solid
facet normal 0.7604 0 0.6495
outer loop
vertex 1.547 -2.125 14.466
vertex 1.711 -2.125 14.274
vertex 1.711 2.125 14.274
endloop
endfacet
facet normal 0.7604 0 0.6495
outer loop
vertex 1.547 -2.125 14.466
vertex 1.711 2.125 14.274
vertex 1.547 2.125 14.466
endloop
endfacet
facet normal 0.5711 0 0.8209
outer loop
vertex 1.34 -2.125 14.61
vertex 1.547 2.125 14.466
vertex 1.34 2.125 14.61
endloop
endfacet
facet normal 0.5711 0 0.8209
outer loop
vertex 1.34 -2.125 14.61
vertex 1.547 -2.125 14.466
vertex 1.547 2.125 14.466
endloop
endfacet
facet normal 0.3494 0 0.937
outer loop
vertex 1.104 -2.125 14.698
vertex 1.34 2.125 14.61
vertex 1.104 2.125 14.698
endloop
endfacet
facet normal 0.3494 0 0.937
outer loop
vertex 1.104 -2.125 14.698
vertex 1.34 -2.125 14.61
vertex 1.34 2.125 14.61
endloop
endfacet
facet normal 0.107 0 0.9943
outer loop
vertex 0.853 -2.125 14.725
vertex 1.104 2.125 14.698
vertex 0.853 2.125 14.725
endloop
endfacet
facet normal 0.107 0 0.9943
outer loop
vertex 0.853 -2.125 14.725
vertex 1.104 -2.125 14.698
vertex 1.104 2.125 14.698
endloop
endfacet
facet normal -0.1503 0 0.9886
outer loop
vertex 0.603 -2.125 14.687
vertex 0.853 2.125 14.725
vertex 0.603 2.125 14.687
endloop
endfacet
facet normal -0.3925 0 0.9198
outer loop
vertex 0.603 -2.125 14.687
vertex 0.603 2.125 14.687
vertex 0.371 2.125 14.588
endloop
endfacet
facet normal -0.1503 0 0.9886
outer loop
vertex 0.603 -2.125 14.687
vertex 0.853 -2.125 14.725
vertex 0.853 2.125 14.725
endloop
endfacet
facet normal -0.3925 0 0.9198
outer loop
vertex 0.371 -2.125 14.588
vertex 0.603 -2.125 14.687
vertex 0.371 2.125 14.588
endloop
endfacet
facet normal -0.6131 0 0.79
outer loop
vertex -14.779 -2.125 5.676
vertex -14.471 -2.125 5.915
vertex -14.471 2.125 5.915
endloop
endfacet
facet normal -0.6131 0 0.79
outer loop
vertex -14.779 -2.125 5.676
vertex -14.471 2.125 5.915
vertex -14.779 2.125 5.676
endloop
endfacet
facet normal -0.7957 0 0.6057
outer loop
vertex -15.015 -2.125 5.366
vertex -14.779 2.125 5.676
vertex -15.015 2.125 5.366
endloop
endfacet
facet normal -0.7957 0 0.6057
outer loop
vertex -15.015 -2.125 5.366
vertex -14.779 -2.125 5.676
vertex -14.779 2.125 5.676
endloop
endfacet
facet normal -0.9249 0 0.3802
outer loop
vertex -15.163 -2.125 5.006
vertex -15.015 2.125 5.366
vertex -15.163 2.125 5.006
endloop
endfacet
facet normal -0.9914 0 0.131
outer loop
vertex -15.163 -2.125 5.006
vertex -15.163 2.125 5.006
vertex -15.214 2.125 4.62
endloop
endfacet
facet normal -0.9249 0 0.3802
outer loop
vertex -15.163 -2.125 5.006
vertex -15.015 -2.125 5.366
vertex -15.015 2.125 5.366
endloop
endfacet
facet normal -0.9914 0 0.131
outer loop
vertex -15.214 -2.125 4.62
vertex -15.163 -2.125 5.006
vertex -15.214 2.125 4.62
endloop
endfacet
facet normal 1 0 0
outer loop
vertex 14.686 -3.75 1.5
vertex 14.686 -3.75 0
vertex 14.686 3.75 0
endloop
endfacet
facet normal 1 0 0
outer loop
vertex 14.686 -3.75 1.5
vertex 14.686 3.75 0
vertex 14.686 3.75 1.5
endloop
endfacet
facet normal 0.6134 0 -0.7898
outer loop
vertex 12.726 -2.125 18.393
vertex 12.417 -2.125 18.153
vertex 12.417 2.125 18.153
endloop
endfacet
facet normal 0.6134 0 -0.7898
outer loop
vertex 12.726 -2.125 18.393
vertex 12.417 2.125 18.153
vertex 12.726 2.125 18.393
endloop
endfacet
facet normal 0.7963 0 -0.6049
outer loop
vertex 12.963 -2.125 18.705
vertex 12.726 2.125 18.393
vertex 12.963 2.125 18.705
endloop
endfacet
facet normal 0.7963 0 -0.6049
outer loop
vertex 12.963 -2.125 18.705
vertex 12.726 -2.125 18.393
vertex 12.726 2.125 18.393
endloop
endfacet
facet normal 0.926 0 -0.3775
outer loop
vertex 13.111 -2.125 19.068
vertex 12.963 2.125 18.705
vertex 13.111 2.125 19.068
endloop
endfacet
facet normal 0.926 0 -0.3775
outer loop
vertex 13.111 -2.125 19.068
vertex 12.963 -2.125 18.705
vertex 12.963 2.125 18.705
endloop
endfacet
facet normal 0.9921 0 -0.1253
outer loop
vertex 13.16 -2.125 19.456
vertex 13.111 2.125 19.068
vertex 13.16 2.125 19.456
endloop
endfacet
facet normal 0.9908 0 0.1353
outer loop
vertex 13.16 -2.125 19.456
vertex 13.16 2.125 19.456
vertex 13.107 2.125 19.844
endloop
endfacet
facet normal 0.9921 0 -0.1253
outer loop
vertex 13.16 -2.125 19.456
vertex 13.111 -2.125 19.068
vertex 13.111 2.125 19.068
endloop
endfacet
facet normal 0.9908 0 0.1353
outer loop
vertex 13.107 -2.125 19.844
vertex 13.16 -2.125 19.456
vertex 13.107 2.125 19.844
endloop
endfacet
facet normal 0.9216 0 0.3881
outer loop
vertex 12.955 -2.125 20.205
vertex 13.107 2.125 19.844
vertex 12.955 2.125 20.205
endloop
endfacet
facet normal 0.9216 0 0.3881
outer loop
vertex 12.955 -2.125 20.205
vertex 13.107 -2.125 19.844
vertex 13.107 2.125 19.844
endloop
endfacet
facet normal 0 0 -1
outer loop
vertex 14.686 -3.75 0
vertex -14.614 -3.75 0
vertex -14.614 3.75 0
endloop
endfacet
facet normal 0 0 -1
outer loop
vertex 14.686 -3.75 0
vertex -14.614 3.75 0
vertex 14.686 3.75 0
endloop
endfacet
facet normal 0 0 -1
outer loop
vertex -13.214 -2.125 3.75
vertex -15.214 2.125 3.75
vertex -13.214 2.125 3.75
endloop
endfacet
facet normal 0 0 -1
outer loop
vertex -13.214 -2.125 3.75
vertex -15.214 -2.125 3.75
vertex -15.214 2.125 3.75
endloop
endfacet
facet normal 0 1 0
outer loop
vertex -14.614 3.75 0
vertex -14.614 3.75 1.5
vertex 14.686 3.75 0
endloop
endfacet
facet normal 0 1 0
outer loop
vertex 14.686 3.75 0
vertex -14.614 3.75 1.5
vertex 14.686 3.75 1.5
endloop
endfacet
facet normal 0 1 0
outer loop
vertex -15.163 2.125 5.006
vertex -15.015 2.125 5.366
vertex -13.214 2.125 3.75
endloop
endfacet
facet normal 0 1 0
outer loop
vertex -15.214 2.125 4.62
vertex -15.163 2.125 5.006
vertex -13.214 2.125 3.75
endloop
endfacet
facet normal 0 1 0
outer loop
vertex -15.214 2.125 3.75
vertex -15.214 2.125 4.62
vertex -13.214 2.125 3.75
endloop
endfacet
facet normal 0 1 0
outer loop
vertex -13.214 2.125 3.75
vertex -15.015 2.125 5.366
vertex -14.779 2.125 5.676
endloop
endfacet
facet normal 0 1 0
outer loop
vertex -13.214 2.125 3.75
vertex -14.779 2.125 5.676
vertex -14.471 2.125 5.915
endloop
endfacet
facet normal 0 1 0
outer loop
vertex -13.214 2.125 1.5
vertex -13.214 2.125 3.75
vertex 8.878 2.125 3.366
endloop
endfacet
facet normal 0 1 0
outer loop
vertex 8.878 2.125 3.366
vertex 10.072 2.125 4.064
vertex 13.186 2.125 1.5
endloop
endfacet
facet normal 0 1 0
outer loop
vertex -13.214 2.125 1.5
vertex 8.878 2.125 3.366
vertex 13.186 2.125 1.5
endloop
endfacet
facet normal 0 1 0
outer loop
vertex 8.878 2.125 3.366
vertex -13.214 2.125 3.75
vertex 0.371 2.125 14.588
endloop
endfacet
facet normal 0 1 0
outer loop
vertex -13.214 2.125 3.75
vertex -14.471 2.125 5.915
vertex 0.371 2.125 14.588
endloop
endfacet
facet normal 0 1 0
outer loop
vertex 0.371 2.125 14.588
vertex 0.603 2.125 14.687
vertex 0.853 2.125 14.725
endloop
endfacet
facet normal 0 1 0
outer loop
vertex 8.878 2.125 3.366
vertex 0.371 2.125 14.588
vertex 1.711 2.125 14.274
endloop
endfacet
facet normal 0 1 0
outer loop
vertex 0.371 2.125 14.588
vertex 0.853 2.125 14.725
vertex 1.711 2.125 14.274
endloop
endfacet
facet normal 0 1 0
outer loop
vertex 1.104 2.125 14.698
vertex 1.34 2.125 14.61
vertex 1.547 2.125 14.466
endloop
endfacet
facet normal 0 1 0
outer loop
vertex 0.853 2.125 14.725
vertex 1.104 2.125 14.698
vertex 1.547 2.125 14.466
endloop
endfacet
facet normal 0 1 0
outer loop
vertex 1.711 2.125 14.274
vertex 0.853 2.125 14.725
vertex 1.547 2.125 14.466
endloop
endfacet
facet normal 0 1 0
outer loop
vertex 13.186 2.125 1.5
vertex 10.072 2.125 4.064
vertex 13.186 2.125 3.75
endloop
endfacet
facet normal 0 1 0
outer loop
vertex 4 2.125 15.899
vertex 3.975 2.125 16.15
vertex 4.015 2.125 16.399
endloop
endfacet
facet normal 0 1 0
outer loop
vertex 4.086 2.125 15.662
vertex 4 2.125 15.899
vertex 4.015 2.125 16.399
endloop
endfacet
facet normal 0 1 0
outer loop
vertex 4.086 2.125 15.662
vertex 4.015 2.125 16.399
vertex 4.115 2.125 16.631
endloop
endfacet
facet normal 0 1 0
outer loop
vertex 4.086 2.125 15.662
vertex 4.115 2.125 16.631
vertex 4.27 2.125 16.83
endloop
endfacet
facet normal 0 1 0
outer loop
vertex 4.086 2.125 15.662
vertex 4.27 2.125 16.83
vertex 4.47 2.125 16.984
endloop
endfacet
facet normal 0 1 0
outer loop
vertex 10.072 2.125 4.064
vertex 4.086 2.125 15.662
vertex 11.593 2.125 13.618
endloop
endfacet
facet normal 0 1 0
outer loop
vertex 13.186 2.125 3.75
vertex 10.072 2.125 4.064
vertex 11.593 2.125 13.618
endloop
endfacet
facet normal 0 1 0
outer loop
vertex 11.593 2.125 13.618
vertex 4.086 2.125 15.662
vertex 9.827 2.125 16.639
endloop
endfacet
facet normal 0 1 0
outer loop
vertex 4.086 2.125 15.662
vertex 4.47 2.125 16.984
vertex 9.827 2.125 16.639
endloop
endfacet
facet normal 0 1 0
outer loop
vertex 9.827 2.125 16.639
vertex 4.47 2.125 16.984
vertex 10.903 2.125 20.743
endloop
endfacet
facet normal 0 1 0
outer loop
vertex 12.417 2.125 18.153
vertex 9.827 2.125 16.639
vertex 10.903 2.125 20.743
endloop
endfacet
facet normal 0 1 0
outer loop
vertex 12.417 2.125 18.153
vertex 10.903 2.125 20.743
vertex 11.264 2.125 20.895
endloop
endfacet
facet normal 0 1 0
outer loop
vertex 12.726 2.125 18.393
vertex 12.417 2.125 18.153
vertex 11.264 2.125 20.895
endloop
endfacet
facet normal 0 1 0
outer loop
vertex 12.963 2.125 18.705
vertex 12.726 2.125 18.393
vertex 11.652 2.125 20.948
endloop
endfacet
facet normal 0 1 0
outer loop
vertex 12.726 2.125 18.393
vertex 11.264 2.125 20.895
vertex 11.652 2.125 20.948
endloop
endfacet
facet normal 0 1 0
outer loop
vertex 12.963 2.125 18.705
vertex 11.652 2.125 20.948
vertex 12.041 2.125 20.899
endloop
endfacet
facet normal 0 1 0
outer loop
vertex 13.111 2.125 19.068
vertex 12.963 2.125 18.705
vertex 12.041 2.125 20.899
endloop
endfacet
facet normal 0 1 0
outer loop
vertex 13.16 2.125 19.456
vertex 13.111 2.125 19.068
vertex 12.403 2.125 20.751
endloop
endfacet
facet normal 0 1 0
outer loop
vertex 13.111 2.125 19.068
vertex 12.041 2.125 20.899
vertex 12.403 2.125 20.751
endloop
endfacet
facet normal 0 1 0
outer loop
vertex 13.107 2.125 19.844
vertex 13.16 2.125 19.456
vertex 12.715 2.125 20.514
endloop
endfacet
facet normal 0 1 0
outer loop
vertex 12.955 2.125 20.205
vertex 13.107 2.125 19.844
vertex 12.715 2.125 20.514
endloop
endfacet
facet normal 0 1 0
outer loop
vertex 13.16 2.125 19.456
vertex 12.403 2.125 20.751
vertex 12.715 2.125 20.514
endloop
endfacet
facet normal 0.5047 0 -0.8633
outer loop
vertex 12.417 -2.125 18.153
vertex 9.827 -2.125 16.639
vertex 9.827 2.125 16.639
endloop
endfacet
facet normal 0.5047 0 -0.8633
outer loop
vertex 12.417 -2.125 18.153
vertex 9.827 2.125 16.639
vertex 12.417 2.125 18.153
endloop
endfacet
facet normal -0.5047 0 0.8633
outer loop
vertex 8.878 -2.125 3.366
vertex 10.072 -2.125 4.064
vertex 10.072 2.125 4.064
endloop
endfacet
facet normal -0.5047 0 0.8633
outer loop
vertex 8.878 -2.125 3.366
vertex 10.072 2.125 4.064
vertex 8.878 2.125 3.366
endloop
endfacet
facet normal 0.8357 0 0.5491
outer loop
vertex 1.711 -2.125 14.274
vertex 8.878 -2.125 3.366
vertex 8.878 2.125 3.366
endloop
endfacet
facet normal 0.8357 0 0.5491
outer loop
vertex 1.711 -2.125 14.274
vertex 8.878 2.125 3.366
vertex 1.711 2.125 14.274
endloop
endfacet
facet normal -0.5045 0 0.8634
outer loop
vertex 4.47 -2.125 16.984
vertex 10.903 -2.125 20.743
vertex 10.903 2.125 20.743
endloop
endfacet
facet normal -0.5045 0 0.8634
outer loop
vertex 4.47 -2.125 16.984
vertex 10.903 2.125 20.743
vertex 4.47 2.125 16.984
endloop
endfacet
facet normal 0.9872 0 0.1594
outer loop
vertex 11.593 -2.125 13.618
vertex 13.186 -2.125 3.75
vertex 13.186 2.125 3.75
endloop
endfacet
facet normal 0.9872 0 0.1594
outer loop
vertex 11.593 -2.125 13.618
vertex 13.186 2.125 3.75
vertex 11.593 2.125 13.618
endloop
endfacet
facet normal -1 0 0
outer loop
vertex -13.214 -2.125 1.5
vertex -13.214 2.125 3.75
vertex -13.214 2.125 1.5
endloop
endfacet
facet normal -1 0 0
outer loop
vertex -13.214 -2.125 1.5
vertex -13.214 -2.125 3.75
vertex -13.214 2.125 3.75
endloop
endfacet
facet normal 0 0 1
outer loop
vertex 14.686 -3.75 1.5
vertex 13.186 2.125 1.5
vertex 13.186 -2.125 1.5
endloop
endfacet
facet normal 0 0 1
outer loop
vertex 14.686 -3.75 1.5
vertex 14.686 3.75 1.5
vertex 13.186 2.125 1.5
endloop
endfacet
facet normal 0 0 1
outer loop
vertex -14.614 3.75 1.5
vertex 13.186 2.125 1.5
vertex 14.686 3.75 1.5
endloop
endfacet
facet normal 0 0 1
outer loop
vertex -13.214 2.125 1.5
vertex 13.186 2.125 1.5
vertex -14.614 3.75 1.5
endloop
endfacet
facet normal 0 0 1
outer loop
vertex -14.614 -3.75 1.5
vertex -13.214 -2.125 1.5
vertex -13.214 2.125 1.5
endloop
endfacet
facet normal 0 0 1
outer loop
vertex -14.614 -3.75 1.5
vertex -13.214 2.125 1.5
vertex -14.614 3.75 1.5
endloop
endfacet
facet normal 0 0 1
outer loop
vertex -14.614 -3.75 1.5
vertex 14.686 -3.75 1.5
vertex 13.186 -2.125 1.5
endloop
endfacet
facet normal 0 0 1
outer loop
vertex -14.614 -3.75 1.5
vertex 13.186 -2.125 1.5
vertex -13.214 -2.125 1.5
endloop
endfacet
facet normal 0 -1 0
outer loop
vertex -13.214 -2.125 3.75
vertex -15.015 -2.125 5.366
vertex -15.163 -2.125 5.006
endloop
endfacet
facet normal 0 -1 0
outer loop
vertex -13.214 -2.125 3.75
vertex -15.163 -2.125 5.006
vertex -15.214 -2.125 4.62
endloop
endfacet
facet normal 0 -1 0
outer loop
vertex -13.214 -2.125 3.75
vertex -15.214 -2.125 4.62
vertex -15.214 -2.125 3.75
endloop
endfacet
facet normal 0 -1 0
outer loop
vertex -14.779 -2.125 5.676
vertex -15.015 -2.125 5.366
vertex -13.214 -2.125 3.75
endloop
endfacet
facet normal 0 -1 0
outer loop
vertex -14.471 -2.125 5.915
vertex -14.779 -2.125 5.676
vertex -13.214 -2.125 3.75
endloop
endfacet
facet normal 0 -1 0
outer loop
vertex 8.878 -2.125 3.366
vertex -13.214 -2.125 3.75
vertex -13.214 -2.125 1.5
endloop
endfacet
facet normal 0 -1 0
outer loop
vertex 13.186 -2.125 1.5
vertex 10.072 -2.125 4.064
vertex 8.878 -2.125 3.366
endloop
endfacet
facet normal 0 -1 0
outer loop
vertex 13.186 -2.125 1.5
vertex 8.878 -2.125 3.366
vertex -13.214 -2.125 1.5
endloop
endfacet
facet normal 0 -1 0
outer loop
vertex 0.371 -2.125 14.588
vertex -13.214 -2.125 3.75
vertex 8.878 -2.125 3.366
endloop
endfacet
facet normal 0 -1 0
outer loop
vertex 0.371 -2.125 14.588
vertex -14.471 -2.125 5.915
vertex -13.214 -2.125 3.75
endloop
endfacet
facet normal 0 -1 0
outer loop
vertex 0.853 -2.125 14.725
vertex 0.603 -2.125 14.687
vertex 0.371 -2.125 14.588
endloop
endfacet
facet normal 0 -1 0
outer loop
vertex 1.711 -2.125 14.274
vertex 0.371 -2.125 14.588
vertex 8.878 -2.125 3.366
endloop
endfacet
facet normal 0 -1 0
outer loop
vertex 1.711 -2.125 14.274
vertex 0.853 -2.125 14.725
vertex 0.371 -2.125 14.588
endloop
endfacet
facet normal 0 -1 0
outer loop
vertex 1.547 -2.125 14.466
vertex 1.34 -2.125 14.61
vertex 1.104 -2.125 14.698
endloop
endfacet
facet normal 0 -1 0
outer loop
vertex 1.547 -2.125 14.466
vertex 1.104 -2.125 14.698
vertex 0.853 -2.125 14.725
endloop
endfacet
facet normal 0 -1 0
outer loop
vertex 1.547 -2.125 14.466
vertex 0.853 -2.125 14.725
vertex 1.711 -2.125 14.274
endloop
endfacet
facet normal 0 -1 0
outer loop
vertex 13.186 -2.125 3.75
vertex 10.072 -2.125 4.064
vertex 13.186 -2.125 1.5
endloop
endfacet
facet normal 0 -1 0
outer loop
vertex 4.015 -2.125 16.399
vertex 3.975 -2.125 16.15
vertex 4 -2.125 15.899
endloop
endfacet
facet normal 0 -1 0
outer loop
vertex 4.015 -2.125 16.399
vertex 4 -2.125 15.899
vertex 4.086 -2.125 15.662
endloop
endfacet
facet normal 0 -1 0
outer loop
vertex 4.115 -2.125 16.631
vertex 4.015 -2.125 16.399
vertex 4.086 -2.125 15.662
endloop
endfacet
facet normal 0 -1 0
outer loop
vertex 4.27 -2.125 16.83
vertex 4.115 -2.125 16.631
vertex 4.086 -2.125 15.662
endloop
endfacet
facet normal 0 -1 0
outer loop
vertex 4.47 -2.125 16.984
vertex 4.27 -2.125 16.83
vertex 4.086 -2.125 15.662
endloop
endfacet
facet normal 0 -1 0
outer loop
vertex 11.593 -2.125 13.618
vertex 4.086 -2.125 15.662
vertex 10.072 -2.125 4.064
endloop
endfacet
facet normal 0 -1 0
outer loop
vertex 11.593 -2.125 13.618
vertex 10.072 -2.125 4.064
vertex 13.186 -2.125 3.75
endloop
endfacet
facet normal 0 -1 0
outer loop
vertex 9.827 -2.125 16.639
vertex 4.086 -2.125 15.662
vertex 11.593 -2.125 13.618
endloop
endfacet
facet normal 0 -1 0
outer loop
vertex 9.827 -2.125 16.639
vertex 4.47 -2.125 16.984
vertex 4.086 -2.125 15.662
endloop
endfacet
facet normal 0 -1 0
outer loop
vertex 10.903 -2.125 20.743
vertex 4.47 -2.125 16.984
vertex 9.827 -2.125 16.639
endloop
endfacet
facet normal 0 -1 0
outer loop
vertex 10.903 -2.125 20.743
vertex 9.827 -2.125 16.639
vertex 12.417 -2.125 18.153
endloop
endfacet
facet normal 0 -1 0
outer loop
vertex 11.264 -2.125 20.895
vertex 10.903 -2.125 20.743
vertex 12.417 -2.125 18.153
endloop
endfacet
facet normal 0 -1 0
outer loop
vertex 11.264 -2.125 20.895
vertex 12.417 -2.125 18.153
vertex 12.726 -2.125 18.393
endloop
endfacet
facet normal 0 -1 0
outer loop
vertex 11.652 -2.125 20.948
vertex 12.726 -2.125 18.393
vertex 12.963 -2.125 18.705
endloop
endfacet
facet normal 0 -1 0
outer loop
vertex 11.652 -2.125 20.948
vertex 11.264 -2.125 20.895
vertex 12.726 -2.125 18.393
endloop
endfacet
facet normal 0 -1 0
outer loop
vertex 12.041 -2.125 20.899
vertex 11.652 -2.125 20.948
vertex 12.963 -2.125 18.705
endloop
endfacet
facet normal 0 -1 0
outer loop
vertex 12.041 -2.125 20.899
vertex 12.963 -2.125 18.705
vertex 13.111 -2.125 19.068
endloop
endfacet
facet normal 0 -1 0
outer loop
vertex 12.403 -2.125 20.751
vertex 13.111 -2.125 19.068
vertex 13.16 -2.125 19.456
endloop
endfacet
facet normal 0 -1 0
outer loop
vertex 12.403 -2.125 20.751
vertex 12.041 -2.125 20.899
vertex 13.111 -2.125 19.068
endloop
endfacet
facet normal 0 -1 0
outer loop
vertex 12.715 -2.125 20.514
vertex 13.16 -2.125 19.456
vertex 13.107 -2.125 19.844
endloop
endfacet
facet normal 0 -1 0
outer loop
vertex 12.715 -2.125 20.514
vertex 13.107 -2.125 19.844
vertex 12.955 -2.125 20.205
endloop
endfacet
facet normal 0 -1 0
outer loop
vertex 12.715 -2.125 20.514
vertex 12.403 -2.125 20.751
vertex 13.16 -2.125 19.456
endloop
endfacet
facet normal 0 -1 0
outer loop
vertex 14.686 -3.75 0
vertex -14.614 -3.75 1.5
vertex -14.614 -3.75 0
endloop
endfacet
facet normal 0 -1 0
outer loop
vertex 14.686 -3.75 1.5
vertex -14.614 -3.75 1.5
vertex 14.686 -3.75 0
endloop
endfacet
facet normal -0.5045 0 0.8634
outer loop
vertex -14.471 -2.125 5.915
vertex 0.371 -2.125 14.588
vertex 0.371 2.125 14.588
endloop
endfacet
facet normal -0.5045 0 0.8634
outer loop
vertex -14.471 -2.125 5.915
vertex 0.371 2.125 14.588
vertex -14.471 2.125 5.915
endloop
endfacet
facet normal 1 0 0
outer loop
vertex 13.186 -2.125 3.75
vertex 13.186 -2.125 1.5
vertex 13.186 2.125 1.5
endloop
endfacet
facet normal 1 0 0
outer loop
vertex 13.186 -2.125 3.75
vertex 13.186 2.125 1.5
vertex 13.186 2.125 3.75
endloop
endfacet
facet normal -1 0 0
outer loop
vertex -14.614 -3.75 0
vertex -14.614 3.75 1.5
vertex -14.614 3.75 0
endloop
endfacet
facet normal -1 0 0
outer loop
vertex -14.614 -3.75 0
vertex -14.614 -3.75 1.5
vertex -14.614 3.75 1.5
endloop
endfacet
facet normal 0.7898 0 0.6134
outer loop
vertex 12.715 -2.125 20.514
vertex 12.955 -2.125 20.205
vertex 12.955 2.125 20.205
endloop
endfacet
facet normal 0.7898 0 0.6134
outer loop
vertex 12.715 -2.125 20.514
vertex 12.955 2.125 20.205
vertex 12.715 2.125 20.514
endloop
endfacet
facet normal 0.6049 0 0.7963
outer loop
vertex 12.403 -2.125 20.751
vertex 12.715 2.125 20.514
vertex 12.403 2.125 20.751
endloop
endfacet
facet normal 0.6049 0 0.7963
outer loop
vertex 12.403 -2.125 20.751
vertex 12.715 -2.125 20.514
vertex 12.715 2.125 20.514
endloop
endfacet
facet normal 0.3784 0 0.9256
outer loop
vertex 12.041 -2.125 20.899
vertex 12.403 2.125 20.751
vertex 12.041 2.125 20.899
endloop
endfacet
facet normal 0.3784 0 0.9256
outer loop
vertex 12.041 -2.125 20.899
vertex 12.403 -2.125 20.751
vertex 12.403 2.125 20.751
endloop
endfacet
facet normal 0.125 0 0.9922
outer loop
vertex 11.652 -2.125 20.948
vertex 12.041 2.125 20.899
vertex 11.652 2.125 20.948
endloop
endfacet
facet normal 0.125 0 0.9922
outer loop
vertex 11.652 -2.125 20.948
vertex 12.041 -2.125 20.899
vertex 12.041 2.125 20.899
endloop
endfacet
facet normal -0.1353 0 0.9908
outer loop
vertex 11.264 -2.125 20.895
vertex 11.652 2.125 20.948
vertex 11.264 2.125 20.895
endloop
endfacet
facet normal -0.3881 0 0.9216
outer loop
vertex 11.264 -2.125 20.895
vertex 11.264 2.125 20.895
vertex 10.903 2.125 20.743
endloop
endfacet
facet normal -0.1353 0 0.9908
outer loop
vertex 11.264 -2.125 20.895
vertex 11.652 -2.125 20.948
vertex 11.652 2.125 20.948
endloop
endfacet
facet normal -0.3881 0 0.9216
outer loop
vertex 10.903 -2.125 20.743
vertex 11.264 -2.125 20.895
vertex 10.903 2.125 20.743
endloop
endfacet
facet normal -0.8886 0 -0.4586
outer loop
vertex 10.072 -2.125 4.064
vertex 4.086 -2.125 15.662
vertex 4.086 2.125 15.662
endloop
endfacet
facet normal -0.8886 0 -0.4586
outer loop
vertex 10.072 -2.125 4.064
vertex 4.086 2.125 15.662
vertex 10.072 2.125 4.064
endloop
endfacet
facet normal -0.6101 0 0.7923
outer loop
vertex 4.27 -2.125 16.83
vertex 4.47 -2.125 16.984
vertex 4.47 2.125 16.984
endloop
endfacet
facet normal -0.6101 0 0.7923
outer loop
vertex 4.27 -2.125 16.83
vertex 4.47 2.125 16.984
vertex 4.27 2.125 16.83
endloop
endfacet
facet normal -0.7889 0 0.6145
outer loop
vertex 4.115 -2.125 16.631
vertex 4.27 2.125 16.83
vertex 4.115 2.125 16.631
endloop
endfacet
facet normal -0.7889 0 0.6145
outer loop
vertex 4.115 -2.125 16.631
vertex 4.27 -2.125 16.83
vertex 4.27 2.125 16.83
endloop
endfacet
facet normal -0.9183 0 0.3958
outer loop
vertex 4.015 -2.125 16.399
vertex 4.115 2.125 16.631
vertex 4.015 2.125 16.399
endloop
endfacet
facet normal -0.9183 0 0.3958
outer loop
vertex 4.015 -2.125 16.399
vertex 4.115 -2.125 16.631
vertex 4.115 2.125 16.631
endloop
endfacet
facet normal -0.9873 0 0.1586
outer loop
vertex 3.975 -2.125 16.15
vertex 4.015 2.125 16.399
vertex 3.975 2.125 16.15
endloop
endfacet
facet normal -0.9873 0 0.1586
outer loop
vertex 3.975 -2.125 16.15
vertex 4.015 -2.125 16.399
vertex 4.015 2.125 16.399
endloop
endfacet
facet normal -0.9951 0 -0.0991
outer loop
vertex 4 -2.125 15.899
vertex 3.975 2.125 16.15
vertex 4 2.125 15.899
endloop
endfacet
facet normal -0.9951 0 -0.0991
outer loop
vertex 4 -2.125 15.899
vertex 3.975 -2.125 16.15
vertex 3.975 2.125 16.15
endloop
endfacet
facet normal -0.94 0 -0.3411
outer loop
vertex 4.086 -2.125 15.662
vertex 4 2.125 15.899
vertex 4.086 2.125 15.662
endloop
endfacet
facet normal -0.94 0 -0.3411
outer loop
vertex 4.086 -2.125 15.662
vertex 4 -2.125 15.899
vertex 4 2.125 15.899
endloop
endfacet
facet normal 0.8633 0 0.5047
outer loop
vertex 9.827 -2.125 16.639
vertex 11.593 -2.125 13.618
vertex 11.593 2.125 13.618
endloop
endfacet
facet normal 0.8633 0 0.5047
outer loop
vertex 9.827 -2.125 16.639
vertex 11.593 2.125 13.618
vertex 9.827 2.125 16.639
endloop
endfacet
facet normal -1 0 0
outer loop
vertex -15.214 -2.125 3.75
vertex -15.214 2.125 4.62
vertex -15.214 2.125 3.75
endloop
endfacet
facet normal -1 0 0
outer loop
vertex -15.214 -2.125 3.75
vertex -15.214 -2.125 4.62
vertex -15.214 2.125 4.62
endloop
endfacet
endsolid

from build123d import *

# Parameters (mm, degrees)
F1_DEPTH = 3.75
F2_DEPTH = 2.125


with BuildPart() as f1:
    # F0 (on Front) → F1 (new body, symmetric)
    with BuildSketch(Plane.XZ):
        Polygon((-14.613904, 1.5), (-14.613904, 0), (14.686096, 0), (14.686096, 1.5), (13.186096, 1.5), (-13.213904, 1.5), align=None)
    extrude(amount=F1_DEPTH, both=True)

    # F0 (on Front) → F2 (join, symmetric)
    with BuildSketch(Plane.XZ):
        with BuildLine():
            Line((-13.213904, 3.75), (-13.213904, 1.5))
            Line((-13.213904, 1.5), (13.186096, 1.5))
            Line((13.186096, 1.5), (13.186096, 3.75))
            Line((13.186096, 3.75), (11.592854, 13.61754))
            Line((11.592854, 13.61754), (9.826933, 16.639381))
            Line((9.826933, 16.639381), (12.417082, 18.153027))
            ThreePointArc((12.417082, 18.153027), (13.11117, 19.067501), (12.955334, 20.204925))
            ThreePointArc((12.955334, 20.204925), (12.04086, 20.899013), (10.903436, 20.743177))
            Line((10.903436, 20.743177), (4.47028, 16.983732))
            ThreePointArc((4.47028, 16.983732), (4.014538, 16.399349), (4.086191, 15.661739))
            Line((4.086191, 15.661739), (10.071552, 4.064036))
            Line((10.071552, 4.064036), (8.877797, 3.366423))
            Line((8.877797, 3.366423), (1.711417, 14.273954))
            ThreePointArc((1.711417, 14.273954), (1.103954, 14.698445), (0.371112, 14.588236))
            Line((0.371112, 14.588236), (-14.470727, 5.914875))
            ThreePointArc((-14.470727, 5.914875), (-15.01491, 5.36638), (-15.213904, 4.6198))
            Line((-15.213904, 4.6198), (-15.213904, 3.75))
            Line((-15.213904, 3.75), (-13.213904, 3.75))
        make_face()
    extrude(amount=F2_DEPTH, both=True)


solid = f1.part
